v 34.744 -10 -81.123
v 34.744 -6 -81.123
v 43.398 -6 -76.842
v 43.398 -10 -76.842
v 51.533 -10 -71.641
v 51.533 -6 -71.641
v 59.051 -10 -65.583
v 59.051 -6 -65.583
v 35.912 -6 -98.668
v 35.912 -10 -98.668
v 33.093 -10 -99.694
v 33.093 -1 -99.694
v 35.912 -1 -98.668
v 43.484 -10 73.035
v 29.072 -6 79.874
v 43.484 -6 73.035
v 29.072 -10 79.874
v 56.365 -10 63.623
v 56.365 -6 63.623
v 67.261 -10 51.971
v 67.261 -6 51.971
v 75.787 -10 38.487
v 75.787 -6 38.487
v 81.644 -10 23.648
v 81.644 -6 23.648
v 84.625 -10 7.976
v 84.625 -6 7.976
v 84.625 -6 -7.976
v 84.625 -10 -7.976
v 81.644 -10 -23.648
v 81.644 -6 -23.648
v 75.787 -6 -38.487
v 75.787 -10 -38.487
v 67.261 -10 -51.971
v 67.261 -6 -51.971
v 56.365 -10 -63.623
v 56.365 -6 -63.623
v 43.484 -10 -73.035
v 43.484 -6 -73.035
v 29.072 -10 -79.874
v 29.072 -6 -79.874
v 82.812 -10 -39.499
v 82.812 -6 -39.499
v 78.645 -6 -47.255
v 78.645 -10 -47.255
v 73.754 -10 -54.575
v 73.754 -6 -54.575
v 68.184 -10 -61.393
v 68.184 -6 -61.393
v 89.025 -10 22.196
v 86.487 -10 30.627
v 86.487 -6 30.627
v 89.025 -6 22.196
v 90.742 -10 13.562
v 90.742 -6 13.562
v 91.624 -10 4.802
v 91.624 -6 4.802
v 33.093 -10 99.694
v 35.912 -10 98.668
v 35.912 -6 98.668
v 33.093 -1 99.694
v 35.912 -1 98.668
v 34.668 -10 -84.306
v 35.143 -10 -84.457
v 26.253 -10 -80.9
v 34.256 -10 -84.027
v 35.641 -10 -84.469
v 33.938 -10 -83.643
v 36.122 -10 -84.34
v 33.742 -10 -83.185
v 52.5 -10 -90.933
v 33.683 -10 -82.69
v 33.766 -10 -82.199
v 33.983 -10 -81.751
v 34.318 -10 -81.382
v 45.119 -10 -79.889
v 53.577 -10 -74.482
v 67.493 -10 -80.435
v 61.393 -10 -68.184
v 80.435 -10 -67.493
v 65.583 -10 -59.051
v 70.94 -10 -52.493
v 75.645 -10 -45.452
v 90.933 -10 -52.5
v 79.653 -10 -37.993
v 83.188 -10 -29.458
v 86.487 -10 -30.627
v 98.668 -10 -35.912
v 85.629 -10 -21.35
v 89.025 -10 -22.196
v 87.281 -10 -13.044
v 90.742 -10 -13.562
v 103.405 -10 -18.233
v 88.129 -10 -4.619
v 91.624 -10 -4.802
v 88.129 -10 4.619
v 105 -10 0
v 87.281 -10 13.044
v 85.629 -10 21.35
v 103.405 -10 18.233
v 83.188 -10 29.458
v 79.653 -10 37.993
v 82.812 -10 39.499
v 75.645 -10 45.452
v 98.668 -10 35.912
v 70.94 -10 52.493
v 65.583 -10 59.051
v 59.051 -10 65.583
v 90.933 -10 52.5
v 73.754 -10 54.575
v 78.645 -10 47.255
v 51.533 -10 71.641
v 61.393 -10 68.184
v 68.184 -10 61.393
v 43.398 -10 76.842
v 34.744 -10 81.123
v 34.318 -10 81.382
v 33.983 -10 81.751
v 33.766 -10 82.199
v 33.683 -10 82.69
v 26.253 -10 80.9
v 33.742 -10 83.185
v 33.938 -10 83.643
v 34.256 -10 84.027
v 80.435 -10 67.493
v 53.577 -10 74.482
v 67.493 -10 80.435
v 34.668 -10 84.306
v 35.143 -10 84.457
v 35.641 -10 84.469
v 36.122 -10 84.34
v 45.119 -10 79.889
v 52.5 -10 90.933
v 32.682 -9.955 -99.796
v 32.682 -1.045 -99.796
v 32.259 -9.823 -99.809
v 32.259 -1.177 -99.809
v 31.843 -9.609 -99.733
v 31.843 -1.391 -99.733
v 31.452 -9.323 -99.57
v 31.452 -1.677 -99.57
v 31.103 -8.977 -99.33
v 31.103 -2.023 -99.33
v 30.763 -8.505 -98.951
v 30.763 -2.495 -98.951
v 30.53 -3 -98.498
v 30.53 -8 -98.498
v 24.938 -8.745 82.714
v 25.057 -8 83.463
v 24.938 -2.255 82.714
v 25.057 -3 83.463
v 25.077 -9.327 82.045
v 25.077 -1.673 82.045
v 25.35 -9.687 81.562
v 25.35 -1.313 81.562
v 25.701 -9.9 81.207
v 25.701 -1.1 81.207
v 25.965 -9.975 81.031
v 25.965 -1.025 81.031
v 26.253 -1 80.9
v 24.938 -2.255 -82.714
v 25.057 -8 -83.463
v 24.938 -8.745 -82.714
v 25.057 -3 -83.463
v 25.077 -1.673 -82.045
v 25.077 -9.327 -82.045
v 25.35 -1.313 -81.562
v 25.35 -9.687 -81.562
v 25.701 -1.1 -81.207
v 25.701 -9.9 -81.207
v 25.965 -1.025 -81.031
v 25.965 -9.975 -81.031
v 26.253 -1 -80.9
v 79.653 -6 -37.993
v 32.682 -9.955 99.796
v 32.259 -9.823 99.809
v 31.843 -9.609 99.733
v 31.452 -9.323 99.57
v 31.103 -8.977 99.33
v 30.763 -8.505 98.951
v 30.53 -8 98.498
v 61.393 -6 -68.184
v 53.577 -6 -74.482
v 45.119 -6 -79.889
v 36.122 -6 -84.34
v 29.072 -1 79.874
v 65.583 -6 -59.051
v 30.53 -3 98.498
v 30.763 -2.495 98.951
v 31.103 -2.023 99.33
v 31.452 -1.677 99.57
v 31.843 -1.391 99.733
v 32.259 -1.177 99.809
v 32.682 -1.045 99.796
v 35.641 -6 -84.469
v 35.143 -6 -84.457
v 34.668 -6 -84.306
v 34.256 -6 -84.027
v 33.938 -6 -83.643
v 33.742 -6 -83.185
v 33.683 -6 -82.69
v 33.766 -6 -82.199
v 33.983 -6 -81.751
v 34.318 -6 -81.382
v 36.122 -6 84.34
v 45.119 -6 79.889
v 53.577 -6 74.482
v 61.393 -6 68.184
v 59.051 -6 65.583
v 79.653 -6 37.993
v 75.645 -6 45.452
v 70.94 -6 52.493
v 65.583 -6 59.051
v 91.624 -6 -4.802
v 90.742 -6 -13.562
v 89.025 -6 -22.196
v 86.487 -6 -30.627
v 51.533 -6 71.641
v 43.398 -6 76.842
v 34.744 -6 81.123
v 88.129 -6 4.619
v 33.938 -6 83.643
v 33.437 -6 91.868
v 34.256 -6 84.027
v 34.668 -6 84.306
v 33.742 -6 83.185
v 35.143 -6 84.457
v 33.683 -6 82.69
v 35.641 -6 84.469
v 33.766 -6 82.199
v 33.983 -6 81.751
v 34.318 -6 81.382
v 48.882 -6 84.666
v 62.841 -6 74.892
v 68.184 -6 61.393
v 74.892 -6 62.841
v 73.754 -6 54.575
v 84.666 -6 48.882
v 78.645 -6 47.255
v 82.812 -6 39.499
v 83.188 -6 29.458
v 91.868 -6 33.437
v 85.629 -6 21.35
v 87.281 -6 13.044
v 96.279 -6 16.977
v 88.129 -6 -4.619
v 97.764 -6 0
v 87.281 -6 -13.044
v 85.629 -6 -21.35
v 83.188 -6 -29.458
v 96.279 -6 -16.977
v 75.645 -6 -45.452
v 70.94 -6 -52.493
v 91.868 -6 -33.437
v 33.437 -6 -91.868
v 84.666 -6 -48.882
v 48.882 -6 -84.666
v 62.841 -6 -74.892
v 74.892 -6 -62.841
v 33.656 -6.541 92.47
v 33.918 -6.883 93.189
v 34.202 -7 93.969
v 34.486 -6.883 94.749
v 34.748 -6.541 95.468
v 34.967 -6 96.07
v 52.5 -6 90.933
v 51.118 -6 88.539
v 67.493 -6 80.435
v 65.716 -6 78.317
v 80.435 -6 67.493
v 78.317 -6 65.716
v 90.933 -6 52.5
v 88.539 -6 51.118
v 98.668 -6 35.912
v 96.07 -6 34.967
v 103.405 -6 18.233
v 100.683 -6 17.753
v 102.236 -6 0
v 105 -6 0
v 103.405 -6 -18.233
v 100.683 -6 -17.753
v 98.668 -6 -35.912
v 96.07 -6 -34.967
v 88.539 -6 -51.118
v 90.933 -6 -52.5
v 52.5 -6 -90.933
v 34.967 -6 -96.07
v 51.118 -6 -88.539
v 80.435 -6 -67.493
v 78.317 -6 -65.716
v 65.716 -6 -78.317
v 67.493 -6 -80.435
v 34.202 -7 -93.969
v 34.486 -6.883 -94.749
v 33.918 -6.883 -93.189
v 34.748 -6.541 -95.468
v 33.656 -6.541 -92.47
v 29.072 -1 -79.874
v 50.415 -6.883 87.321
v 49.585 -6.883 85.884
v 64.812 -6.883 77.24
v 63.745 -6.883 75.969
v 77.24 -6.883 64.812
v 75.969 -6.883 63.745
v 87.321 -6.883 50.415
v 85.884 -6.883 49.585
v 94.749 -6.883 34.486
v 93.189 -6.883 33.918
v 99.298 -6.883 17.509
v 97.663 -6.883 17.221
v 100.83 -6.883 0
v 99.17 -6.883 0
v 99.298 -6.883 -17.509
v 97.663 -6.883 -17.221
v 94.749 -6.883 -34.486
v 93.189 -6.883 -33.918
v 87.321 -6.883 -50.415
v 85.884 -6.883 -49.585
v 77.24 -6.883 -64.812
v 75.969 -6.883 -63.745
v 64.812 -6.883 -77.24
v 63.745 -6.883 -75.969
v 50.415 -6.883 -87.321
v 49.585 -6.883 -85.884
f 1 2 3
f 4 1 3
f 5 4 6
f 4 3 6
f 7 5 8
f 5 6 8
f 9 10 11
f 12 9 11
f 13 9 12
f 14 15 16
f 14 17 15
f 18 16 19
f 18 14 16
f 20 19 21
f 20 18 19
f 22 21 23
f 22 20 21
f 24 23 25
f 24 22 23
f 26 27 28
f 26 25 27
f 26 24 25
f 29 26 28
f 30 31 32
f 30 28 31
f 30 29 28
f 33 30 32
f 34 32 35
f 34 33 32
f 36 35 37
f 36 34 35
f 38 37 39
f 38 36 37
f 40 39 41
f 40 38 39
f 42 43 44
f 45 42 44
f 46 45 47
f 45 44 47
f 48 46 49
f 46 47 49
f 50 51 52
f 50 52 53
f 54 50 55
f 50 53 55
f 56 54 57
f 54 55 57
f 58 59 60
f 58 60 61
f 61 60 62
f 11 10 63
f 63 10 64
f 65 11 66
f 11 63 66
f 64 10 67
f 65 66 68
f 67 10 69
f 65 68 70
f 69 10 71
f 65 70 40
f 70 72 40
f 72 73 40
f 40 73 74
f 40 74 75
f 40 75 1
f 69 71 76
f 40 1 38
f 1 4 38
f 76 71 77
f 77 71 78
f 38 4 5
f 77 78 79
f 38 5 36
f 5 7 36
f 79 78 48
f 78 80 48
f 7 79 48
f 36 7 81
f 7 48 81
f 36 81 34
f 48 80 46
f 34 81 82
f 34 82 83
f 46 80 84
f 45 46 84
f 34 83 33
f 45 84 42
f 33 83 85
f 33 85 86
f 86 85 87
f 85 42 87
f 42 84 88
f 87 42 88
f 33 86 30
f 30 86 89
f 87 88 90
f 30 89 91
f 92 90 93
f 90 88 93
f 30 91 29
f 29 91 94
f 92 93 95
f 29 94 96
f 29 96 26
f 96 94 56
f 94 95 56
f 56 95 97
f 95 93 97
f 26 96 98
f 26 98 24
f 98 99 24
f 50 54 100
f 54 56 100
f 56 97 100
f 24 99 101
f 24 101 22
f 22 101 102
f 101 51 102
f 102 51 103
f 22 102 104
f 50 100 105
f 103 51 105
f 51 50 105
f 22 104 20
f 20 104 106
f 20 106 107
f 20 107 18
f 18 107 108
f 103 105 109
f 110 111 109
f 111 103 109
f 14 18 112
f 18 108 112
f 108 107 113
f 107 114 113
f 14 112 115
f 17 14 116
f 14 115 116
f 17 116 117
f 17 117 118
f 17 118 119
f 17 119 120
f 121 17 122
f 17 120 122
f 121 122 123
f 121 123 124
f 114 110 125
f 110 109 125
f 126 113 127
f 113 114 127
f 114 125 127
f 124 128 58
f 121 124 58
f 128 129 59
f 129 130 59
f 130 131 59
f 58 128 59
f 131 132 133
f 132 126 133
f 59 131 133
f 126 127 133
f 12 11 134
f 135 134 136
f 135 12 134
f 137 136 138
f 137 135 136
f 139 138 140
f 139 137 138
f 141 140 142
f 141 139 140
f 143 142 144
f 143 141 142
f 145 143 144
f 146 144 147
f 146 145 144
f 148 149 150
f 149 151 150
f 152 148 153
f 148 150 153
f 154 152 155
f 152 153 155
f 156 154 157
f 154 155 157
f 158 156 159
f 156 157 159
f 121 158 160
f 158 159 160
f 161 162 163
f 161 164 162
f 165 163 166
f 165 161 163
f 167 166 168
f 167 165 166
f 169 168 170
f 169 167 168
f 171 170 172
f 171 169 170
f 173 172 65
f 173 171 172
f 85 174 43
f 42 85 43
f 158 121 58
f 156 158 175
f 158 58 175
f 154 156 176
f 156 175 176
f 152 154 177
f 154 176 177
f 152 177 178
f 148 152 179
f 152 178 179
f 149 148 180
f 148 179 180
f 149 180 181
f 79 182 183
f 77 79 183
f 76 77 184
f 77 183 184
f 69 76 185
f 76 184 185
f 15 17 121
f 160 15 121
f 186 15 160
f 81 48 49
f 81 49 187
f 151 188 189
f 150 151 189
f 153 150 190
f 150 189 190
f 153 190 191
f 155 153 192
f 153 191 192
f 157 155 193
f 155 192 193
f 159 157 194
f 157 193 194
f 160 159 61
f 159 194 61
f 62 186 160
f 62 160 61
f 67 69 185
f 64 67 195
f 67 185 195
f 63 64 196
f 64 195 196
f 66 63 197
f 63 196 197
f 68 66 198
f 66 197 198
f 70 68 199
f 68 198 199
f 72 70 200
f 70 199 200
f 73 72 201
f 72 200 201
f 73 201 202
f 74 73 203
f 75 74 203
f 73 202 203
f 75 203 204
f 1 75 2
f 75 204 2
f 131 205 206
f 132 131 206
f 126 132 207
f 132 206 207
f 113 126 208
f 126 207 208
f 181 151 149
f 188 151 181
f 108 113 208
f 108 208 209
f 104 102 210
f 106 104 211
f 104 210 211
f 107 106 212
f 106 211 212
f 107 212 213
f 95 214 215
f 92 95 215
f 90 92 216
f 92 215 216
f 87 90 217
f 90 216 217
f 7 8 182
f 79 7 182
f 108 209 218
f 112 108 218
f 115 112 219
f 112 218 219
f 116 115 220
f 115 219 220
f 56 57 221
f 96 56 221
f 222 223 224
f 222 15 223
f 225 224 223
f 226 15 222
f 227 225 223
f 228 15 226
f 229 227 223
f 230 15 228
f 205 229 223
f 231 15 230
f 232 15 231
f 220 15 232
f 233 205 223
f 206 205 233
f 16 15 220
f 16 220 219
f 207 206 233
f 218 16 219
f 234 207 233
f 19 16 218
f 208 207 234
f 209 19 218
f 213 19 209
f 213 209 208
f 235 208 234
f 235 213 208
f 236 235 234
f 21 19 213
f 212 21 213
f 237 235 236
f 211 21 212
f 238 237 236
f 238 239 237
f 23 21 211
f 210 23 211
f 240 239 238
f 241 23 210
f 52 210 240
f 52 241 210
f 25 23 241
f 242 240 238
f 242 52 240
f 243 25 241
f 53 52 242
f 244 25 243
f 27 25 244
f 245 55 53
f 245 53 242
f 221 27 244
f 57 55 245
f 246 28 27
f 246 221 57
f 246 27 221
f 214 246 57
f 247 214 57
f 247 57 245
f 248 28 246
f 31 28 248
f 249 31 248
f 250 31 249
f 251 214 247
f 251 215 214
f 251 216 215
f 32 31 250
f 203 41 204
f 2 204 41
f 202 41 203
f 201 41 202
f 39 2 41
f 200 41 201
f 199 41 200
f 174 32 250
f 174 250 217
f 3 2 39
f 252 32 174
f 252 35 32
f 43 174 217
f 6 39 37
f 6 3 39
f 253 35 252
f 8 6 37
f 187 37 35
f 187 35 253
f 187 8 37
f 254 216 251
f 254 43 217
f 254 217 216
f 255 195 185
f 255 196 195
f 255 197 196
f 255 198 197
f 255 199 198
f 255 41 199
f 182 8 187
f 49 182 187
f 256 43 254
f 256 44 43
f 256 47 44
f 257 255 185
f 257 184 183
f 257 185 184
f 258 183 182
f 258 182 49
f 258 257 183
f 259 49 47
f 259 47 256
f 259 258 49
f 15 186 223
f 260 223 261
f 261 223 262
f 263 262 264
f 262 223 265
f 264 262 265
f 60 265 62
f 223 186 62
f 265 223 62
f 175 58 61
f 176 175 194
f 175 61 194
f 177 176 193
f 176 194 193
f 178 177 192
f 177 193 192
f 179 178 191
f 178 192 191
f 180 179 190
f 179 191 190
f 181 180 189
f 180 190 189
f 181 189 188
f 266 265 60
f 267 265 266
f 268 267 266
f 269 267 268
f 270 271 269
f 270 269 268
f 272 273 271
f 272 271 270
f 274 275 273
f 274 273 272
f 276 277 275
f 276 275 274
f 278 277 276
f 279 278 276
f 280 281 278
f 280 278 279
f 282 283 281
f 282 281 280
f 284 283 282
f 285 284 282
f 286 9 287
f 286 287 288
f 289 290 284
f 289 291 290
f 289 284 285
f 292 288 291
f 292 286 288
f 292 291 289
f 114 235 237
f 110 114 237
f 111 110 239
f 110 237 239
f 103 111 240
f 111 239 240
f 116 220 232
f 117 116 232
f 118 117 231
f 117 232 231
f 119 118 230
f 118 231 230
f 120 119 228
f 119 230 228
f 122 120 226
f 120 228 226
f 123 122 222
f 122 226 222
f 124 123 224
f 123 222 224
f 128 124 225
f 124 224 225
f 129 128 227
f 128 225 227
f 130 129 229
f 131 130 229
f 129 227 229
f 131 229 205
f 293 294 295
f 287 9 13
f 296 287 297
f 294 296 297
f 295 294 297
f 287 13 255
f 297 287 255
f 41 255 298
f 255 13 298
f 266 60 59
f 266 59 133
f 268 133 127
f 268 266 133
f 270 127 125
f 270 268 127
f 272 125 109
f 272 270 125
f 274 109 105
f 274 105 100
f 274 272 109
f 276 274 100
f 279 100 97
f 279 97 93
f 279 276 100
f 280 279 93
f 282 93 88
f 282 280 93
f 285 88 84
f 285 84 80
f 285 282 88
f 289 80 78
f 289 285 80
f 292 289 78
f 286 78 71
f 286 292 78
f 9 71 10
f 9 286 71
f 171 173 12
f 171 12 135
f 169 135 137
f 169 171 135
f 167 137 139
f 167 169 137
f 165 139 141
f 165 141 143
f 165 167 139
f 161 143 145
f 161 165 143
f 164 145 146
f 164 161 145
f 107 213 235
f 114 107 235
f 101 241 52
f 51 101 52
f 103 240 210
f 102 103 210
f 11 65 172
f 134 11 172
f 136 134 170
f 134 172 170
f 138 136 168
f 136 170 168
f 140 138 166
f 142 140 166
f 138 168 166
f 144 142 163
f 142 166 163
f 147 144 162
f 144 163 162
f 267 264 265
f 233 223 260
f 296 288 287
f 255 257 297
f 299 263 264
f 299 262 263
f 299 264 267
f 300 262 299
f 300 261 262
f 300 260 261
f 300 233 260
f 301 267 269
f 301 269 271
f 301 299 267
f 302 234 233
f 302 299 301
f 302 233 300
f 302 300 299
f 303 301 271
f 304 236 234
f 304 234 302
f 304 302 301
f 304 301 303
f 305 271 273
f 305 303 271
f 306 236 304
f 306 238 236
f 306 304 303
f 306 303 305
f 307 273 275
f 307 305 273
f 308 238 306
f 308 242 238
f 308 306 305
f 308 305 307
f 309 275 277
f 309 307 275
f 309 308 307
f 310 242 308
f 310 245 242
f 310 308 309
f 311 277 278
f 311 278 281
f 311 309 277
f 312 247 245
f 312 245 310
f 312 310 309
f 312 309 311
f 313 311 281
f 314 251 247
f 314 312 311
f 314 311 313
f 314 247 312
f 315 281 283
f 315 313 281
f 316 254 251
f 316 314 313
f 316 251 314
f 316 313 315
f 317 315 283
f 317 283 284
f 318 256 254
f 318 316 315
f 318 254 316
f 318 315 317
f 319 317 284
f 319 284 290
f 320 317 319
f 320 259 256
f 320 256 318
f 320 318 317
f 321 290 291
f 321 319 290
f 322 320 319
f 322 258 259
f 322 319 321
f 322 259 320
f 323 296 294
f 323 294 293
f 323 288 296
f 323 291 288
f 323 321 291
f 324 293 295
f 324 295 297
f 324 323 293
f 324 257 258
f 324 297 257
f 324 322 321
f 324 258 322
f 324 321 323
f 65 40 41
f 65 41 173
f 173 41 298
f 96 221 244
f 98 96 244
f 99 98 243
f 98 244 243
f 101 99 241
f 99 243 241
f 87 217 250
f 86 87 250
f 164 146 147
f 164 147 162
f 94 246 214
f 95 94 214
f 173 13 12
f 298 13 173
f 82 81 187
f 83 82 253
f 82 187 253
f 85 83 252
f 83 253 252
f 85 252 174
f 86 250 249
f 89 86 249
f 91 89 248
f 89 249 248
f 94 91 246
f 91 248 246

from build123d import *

# Parameters (mm, degrees)
REVOLVE_1_ANGLE     = 140
SKETCH_3_W          = 20
SKETCH_3_H          = 9
EXTRUDE_1_DEPTH     = 5
SKETCH_4_W          = 20
SKETCH_4_H          = 9
EXTRUDE_2_DEPTH     = 5
CUT_EXTRUDE_1_DEPTH = 5
FILLET_1_R          = 2
EXTRUDE_START       = -4
EXTRUDE_3_DEPTH     = 4


with BuildPart() as part:
    # 草图2 → 旋转1 (revolve, symmetric)
    with BuildSketch(Plane.XY) as revolve_1_sk:
        with BuildLine():
            ThreePointArc((102.236067977, -6), (100, -7), (97.763932023, -6))
            Line((97.763932023, -6), (85, -6))
            Line((85, -6), (85, -10))
            Line((85, -10), (105, -10))
            Line((105, -10), (105, -6))
            Line((105, -6), (102.236067977, -6))
        make_face()
    revolve(axis=Axis((0, 24.366902053, 0), (0, -1, 0)), revolution_arc=REVOLVE_1_ANGLE / 2)
    revolve(revolve_1_sk.sketch, axis=Axis((0, 24.366902053, 0), (0, 1, 0)), revolution_arc=REVOLVE_1_ANGLE / 2)

    # 草图3 → 凸台-拉伸1 (add)
    with BuildSketch(Plane(origin=(0, 0, 0), x_dir=(0.34202014332566616, 0, 0.9396926207859094), z_dir=(-0.9396926207859093, 0, 0.3420201433256661))):
        with Locations((95, -5.5)):
            Rectangle(SKETCH_3_W, SKETCH_3_H)
    extrude(amount=EXTRUDE_1_DEPTH)

    # 草图4 → 凸台-拉伸2 (add)
    with BuildSketch(Plane(origin=(0, 0, 0), x_dir=(-0.34202014332566616, 0, 0.9396926207859094), z_dir=(-0.9396926207859094, 0, -0.34202014332566616))):
        with Locations((-95, -5.5)):
            Rectangle(SKETCH_4_W, SKETCH_4_H)
    extrude(amount=EXTRUDE_2_DEPTH)

    # 草图5 → 切除-拉伸1 (cut)
    with BuildSketch(Plane(origin=(0, -6, 0), x_dir=(1, 0, 0), z_dir=(0, 1, 0))):
        with BuildLine():
            ThreePointArc((34.743766956, 81.122950869), (88.25, -6.1e-08), (34.743766843, -81.122950917))
            ThreePointArc((34.743766843, -81.122950917), (33.82406612, -83.420591403), (36.121706789, -84.340291668))
            ThreePointArc((36.121706789, -84.340291668), (91.75, 4e-08), (36.121706715, 84.3402917))
            ThreePointArc((36.121706715, 84.3402917), (33.82406608, 83.42059131), (34.743766956, 81.122950869))
        make_face()
    extrude(amount=-CUT_EXTRUDE_1_DEPTH, mode=Mode.SUBTRACT)

    # 圆角1
    fillet_1_edges = [part.edges().sort_by_distance(p)[0] for p in [
        (24.373249079, -5.5, 81.583973483),
        (31.213651945, -5.5, 100.377825899),
        (27.793450512, -1, 90.980899691),
        (27.793450512, -10, 90.980899691),
        (31.213651945, -5.5, -100.377825899),
        (24.373249079, -5.5, -81.583973483),
        (27.793450512, -1, -90.980899691),
        (27.793450512, -10, -90.980899691),
    ]]
    fillet(fillet_1_edges, radius=FILLET_1_R)

    # 草图6 → 凸台-拉伸3 (add)
    with BuildSketch(Plane.XZ.offset(10).offset(EXTRUDE_START)):
        with BuildLine():
            ThreePointArc((59.050776011, 65.582530848), (62.40217344, 62.40217344), (65.582530848, 59.050776011))
            Line((65.582530848, 59.050776011), (68.183537738, 61.392733133))
            ThreePointArc((68.183537738, 61.392733133), (64.877047174, 64.877047174), (61.392733133, 68.183537738))
            Line((61.392733133, 68.183537738), (59.050776011, 65.582530848))
        make_face()
        with BuildLine():
            ThreePointArc((79.653151344, 37.992604293), (81.532368744, 33.771812906), (83.188111589, 29.458455327))
            Line((83.188111589, 29.458455327), (86.487356808, 30.626779335))
            ThreePointArc((86.487356808, 30.626779335), (84.765947108, 35.111204919), (82.812199839, 39.499393132))
            Line((82.812199839, 39.499393132), (79.653151344, 37.992604293))
        make_face()
        with BuildLine():
            Line((91.624259814, 4.801823985), (88.129056442, 4.618648138))
            ThreePointArc((88.129056442, 4.618648138), (88.219758929, 2.310115688), (88.25, 0))
            ThreePointArc((88.25, 0), (88.219758929, -2.310115688), (88.129056442, -4.618648138))
            Line((88.129056442, -4.618648138), (91.624259814, -4.801823985))
            ThreePointArc((91.624259814, -4.801823985), (91.718559567, -2.401735007), (91.75, 0))
            ThreePointArc((91.75, 0), (91.718559567, 2.401735007), (91.624259814, 4.801823985))
        make_face()
        with BuildLine():
            ThreePointArc((83.188111589, -29.458455327), (81.532368744, -33.771812906), (79.653151344, -37.992604293))
            Line((79.653151344, -37.992604293), (82.812199839, -39.499393132))
            ThreePointArc((82.812199839, -39.499393132), (84.765947108, -35.111204919), (86.487356808, -30.626779335))
            Line((86.487356808, -30.626779335), (83.188111589, -29.458455327))
        make_face()
        with BuildLine():
            ThreePointArc((65.582530848, -59.050776011), (62.40217344, -62.40217344), (59.050776011, -65.582530848))
            Line((59.050776011, -65.582530848), (61.392733133, -68.183537738))
            ThreePointArc((61.392733133, -68.183537738), (64.877047174, -64.877047174), (68.183537738, -61.392733133))
            Line((68.183537738, -61.392733133), (65.582530848, -59.050776011))
        make_face()
    extrude(amount=EXTRUDE_3_DEPTH)


solid = part.part
